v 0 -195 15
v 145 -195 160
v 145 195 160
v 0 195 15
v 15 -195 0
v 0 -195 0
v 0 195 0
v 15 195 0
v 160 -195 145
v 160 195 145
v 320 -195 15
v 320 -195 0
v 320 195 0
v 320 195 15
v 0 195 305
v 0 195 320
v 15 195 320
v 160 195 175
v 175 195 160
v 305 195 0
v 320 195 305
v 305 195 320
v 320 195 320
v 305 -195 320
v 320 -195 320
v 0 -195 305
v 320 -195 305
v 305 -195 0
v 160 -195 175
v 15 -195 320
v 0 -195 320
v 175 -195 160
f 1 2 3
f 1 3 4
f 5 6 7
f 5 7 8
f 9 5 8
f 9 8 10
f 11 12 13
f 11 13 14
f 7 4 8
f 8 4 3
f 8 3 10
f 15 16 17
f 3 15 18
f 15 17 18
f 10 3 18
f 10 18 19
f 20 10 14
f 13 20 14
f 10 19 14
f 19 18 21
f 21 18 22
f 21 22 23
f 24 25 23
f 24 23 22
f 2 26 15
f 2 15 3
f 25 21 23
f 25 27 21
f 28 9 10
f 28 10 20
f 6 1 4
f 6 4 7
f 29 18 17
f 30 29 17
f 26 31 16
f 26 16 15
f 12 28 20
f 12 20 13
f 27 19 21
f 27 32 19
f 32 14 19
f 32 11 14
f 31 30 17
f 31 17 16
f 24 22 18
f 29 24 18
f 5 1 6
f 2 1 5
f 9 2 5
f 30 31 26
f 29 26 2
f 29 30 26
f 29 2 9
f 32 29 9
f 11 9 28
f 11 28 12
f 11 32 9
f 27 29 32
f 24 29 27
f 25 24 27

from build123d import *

# Parameters (mm, degrees)
F1_DEPTH = 195


with BuildPart() as f1:
    # F0 (on Front) → F1 (new body, symmetric)
    with BuildSketch(Plane.XZ):
        Polygon((319.9999762337, 305), (319.9999762337, 320), (304.9999762337, 320), (159.9999870028, 175), (174.9999875598, 160.000000557), align=None)
        Polygon((174.9999875598, 160.000000557), (159.9999870028, 175), (14.9999762337, 320), (-2.37663e-05, 320), (0, 305), (145.0000048275, 160.0000167107), (-1.114e-06, 15), (0, 0), (15, 1.114e-06), (160.0000059416, 145.0000178247), (305.0000226523, 2.26523e-05), (320, 2.37663e-05), (319.9999762337, 15.0000226523), align=None)
    extrude(amount=F1_DEPTH, both=True)


solid = f1.part
